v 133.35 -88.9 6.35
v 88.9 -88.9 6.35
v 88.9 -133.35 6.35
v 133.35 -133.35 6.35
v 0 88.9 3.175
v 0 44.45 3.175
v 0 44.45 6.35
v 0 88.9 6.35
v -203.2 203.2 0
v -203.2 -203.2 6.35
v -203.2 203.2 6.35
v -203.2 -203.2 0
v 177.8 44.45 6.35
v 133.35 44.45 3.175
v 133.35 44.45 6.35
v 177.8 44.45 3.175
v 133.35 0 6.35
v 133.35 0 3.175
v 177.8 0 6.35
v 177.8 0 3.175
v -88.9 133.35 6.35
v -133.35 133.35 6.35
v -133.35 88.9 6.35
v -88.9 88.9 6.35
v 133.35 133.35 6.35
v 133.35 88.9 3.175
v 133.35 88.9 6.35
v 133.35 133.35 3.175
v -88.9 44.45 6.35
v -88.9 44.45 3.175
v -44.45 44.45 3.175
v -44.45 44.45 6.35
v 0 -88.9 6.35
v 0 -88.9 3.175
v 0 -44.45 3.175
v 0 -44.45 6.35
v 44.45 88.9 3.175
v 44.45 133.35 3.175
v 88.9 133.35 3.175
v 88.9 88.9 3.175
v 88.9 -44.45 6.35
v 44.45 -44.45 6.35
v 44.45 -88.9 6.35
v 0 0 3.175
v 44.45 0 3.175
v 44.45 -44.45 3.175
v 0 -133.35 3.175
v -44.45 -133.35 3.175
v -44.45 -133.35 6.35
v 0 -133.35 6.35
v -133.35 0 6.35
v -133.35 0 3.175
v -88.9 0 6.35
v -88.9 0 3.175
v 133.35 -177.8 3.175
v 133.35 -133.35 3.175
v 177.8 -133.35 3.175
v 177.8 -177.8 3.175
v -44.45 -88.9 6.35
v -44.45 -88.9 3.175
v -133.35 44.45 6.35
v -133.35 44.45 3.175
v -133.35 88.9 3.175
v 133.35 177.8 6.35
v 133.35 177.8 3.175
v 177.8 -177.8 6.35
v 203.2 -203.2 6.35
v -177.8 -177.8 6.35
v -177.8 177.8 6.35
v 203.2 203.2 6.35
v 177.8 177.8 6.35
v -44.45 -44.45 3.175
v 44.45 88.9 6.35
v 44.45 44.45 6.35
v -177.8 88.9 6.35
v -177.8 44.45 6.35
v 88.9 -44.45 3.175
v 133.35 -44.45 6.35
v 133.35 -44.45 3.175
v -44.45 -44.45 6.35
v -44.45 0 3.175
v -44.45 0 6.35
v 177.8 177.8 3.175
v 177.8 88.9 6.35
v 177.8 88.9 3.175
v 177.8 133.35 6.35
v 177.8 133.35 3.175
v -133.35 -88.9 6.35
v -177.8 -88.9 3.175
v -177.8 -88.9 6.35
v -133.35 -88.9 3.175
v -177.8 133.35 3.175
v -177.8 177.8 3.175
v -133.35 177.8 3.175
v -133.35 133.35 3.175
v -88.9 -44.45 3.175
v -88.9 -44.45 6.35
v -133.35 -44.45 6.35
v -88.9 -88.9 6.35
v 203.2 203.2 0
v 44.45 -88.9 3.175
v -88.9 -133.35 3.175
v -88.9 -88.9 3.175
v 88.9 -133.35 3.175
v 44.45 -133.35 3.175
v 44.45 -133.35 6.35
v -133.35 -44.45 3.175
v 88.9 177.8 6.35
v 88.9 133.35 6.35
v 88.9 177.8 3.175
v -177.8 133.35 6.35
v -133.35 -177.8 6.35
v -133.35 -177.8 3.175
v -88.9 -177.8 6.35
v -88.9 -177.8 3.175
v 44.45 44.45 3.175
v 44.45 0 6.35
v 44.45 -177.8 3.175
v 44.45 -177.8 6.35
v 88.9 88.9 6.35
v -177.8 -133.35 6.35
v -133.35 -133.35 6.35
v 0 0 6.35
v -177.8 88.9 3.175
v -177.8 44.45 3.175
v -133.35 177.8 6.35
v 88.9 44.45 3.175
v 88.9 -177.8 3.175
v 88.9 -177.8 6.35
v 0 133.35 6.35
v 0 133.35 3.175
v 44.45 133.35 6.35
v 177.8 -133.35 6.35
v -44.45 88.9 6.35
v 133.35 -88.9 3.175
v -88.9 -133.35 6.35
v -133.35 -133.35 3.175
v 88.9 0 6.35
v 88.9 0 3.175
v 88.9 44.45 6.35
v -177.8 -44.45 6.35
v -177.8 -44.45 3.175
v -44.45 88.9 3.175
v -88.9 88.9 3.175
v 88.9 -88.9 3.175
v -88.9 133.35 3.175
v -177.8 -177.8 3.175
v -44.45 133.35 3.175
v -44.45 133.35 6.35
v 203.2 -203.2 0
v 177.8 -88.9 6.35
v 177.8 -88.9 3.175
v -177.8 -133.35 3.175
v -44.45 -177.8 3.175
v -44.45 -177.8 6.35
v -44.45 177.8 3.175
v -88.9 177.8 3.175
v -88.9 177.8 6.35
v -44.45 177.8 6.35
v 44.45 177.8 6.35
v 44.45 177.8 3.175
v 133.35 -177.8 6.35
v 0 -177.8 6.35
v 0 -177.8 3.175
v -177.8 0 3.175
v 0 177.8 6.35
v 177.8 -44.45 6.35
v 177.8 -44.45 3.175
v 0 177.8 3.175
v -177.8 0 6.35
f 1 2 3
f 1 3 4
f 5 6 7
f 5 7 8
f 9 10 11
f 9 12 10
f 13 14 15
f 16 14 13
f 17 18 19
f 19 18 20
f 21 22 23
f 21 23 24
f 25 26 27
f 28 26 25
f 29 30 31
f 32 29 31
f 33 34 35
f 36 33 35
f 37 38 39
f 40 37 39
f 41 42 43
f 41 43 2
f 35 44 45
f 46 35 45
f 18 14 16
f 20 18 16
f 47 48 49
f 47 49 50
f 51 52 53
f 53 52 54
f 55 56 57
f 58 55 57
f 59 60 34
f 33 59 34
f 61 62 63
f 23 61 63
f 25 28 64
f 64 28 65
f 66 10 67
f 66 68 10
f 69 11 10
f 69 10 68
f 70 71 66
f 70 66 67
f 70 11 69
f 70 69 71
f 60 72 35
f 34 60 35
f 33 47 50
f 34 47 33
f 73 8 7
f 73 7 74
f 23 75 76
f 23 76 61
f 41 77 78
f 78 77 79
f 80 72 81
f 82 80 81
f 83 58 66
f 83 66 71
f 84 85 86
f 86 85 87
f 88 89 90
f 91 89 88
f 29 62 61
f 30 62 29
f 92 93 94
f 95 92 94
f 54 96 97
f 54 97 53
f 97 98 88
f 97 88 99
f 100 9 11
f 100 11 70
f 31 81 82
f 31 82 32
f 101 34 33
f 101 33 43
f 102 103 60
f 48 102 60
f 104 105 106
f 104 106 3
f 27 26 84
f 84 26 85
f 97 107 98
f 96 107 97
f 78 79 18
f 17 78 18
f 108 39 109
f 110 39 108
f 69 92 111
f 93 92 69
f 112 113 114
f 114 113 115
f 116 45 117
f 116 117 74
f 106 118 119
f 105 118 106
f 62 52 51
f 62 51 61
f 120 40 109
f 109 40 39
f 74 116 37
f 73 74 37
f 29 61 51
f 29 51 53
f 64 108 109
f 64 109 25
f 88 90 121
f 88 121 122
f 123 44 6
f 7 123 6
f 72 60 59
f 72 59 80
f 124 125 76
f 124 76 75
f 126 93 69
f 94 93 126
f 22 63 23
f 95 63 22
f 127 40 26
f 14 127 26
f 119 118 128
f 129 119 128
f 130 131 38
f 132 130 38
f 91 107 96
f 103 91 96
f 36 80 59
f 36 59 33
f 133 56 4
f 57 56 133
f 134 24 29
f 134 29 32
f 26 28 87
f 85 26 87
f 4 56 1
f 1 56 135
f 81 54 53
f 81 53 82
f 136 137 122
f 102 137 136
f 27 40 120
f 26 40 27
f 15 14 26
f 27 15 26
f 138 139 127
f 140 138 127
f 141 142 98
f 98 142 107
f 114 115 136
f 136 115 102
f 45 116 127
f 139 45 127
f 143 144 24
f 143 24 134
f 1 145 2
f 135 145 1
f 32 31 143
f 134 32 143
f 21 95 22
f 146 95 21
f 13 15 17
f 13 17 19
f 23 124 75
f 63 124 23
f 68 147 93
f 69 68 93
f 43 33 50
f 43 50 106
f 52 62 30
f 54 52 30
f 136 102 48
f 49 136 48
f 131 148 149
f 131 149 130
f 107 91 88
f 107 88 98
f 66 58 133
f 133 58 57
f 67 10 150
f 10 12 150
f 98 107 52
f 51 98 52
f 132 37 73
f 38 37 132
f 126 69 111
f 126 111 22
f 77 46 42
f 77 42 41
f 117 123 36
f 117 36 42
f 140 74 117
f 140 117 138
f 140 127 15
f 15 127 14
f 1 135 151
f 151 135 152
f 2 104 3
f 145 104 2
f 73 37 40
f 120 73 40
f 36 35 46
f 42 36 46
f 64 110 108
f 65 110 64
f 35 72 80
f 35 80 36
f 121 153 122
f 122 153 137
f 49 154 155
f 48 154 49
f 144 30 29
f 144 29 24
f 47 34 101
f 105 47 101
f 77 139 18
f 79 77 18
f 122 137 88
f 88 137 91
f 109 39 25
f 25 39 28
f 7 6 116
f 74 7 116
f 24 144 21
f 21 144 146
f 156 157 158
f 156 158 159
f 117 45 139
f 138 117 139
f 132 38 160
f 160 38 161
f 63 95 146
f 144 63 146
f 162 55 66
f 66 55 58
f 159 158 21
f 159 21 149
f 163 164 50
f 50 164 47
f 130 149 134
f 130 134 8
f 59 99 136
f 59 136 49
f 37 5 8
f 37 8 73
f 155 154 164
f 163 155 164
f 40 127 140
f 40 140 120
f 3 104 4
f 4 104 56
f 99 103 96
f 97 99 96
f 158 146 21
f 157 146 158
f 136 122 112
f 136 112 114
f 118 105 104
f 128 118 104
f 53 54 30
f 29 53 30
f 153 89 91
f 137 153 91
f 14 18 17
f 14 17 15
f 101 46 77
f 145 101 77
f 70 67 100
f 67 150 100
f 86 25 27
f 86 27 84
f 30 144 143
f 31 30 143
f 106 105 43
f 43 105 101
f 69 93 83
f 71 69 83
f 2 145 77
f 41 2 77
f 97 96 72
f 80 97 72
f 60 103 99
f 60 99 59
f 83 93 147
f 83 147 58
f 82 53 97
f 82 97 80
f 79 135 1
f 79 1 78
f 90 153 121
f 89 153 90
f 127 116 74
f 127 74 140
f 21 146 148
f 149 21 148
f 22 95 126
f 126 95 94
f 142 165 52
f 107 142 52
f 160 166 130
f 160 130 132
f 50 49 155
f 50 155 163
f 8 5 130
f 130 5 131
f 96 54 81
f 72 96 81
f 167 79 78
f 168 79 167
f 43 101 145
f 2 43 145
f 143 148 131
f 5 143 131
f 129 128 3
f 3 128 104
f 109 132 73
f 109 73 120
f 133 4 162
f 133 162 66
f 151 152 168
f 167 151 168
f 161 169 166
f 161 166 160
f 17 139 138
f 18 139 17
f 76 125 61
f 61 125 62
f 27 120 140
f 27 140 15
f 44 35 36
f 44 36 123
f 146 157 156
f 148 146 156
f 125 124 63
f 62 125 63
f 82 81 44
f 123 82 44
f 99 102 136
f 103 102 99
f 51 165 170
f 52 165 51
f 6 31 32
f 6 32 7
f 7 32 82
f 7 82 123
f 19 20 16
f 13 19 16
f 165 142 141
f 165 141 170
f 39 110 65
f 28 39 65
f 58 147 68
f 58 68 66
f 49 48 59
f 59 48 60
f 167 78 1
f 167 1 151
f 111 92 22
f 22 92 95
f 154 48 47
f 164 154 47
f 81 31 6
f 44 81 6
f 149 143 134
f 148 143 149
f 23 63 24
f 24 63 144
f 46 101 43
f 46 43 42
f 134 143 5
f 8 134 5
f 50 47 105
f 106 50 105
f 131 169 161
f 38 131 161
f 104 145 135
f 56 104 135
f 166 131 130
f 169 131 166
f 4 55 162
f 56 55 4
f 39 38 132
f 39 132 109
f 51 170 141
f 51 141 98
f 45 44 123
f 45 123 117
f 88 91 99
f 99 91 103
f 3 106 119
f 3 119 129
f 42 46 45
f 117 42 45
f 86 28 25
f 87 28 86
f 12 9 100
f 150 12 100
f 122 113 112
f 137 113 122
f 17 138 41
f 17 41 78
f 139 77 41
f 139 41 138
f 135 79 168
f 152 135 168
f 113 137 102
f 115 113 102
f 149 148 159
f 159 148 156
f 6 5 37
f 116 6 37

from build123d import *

# Parameters (mm, degrees)
F0_W     = 406.4
F0_H     = 406.4
F1_DEPTH = 3.175
F2_W     = 406.4
F2_H     = 406.4
F2_W_2   = 355.6
F2_H_2   = 355.6
F3_DEPTH = 3.175
F4_W     = 44.45
F4_H     = 44.45
F5_DEPTH = 3.175


with BuildPart() as f1:
    # F0 (on Top) → F1 (new body)
    with BuildSketch(Plane.XY):
        Rectangle(F0_W, F0_H)
    extrude(amount=F1_DEPTH)

    # F2 (on face) → F3 (join)
    with BuildSketch(Plane.XY.offset(3.175)):
        Rectangle(F2_W, F2_H)
        Rectangle(F2_W_2, F2_H_2, mode=Mode.SUBTRACT)
    extrude(amount=F3_DEPTH)


with BuildPart() as f5:
    # F4 (on face) → F5 (new body)
    with BuildSketch(Plane.XY.offset(3.175)):
        with Locations((-155.575, 155.575)):
            Rectangle(F4_W, F4_H)
        with Locations((-66.675, 155.575)):
            Rectangle(F4_W, F4_H)
        with Locations((22.225, 155.575)):
            Rectangle(F4_W, F4_H)
        with Locations((111.125, 155.575)):
            Rectangle(F4_W, F4_H)
        with Locations((-111.125, 111.125)):
            Rectangle(F4_W, F4_H)
        with Locations((-22.225, 111.125)):
            Rectangle(F4_W, F4_H)
        with Locations((66.675, 111.125)):
            Rectangle(F4_W, F4_H)
        with Locations((155.575, 111.125)):
            Rectangle(F4_W, F4_H)
        with Locations((111.125, 66.675)):
            Rectangle(F4_W, F4_H)
        with Locations((22.225, 66.675)):
            Rectangle(F4_W, F4_H)
        with Locations((-66.675, 66.675)):
            Rectangle(F4_W, F4_H)
        with Locations((-155.575, 66.675)):
            Rectangle(F4_W, F4_H)
        with Locations((-111.125, 22.225)):
            Rectangle(F4_W, F4_H)
        with Locations((-22.225, 22.225)):
            Rectangle(F4_W, F4_H)
        with Locations((66.675, 22.225)):
            Rectangle(F4_W, F4_H)
        with Locations((155.575, 22.225)):
            Rectangle(F4_W, F4_H)
        with Locations((111.125, -22.225)):
            Rectangle(F4_W, F4_H)
        with Locations((22.225, -22.225)):
            Rectangle(F4_W, F4_H)
        with Locations((-66.675, -22.225)):
            Rectangle(F4_W, F4_H)
        with Locations((-155.575, -22.225)):
            Rectangle(F4_W, F4_H)
        with Locations((-111.125, -66.675)):
            Rectangle(F4_W, F4_H)
        with Locations((-22.225, -66.675)):
            Rectangle(F4_W, F4_H)
        with Locations((66.675, -66.675)):
            Rectangle(F4_W, F4_H)
        with Locations((155.575, -66.675)):
            Rectangle(F4_W, F4_H)
        with Locations((111.125, -111.125)):
            Rectangle(F4_W, F4_H)
        with Locations((22.225, -111.125)):
            Rectangle(F4_W, F4_H)
        with Locations((-66.675, -111.125)):
            Rectangle(F4_W, F4_H)
        with Locations((-155.575, -111.125)):
            Rectangle(F4_W, F4_H)
        with Locations((-111.125, -155.575)):
            Rectangle(F4_W, F4_H)
        with Locations((-22.225, -155.575)):
            Rectangle(F4_W, F4_H)
        with Locations((66.675, -155.575)):
            Rectangle(F4_W, F4_H)
        with Locations((155.575, -155.575)):
            Rectangle(F4_W, F4_H)
    extrude(amount=F5_DEPTH)


solid = Compound([f1.part, f5.part])
